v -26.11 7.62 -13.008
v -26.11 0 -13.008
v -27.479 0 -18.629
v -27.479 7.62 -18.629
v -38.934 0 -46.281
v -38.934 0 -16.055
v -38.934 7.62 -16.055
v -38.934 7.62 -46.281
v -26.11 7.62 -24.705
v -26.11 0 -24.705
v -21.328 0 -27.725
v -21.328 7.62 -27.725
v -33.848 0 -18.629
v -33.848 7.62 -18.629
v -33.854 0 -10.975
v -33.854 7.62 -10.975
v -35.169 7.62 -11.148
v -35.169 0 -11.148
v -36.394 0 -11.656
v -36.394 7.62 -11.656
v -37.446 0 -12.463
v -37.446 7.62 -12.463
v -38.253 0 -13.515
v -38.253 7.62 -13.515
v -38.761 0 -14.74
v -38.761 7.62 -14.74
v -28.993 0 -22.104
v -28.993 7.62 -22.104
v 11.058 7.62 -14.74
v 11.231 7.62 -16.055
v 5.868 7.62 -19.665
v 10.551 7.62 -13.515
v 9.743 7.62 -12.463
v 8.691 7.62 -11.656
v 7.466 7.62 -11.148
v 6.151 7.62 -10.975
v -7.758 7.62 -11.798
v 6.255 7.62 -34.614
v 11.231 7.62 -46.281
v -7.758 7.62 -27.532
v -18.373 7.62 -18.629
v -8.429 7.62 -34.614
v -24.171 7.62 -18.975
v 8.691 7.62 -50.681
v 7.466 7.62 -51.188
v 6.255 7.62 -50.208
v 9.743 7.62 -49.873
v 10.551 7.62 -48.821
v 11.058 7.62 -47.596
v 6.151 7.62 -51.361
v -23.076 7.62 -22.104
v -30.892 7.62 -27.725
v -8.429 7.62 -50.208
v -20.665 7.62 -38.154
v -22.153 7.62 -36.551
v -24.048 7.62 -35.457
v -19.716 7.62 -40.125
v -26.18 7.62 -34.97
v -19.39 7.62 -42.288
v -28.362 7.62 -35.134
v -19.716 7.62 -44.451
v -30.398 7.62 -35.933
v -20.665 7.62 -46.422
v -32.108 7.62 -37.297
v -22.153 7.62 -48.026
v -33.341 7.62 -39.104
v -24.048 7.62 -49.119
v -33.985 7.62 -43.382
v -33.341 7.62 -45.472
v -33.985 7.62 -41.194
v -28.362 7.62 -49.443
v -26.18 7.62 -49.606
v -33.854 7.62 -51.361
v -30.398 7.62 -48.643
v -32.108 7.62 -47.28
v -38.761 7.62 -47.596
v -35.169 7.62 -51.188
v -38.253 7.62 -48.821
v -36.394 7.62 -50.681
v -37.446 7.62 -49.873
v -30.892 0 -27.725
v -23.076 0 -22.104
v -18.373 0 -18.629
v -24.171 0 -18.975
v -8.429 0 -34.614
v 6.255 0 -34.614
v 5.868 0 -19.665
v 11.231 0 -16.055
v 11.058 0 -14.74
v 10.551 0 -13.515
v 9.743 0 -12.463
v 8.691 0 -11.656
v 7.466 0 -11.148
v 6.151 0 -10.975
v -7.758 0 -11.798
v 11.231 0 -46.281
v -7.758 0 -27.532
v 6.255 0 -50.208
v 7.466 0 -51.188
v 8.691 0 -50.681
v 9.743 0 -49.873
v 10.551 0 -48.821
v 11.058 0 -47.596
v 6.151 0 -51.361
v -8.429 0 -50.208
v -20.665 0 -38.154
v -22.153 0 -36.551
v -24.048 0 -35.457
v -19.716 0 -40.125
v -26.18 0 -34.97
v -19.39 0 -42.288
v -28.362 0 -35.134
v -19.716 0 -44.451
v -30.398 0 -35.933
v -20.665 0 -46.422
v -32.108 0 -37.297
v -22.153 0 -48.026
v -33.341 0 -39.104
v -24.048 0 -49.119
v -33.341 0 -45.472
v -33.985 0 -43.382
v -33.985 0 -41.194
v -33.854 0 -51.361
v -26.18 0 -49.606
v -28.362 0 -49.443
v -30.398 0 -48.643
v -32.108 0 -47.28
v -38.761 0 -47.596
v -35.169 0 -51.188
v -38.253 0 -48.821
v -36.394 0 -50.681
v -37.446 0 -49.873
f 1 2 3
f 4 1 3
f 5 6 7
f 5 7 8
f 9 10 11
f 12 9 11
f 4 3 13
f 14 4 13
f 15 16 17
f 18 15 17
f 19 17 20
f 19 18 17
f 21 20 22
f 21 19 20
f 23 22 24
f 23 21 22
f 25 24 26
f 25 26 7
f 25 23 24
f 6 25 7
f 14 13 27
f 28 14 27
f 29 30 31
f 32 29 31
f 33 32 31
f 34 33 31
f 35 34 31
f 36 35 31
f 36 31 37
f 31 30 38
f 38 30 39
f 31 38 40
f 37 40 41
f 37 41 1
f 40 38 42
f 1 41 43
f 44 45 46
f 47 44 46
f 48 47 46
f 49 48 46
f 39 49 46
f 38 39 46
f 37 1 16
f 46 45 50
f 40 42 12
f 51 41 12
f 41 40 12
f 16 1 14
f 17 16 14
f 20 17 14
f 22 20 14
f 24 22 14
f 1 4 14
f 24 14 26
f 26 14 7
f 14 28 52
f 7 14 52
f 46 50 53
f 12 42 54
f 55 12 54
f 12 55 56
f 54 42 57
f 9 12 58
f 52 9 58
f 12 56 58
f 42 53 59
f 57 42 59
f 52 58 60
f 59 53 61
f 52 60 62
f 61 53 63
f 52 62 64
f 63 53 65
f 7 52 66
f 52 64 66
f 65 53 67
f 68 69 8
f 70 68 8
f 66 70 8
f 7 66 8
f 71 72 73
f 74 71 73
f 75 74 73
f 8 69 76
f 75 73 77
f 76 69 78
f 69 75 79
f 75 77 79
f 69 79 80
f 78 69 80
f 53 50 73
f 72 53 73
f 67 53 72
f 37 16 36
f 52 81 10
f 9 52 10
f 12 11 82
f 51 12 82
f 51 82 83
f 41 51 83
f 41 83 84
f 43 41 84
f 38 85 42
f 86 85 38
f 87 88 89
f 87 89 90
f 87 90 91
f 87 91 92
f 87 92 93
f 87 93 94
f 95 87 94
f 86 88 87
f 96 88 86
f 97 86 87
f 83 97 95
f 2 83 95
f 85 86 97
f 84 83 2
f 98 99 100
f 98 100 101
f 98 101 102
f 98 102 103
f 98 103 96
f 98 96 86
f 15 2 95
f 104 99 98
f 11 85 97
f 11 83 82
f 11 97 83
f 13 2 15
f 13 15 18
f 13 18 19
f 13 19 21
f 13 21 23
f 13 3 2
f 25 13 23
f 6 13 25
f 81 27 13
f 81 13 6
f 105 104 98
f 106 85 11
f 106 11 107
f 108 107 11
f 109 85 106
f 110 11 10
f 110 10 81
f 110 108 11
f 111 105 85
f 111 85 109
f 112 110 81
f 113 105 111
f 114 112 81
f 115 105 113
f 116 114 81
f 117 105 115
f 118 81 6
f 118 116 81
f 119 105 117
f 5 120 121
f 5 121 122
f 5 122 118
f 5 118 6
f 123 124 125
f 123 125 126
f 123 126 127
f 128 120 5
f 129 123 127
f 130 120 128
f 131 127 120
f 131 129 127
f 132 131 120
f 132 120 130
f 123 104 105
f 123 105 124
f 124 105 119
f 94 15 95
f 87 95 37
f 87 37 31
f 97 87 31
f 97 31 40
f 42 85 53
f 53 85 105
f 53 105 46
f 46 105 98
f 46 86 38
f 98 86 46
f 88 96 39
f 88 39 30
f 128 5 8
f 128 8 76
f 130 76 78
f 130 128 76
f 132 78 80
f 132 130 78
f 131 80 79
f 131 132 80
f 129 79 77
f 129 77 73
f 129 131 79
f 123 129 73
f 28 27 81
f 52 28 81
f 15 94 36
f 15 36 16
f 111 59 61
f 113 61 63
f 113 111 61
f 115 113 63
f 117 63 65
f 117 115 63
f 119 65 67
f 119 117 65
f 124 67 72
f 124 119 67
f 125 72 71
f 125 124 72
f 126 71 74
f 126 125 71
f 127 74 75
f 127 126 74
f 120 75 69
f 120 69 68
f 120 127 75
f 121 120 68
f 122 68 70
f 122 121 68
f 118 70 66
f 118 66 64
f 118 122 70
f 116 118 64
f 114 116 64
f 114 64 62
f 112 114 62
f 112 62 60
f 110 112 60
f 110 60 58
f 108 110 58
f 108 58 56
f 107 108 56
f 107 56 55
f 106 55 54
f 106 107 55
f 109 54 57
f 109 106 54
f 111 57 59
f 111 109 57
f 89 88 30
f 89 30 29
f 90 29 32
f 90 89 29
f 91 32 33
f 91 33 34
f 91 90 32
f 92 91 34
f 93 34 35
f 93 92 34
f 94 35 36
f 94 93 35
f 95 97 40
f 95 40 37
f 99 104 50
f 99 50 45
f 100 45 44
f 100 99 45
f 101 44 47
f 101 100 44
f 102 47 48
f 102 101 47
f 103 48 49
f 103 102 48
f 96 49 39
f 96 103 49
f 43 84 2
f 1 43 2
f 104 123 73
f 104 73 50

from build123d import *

# Parameters (mm, degrees)
SKETCH1_R           = 7.338508892
SKETCH1_W           = 14.683745891
SKETCH1_H           = 15.594449323
BOSS_EXTRUDE6_DEPTH = 7.62


with BuildPart() as part:
    # Sketch1 → Boss-Extrude6 (new body)
    with BuildSketch(Plane(origin=(0, 0, 0), x_dir=(1, 0, 0), z_dir=(0, 1, 0))):
        with BuildLine():
            Line((-33.85382456, 51.361208868), (6.15117544, 51.361208868))
            ThreePointArc((6.15117544, 51.361208868), (9.743277889, 49.873311317), (11.23117544, 46.281208868))
            Line((11.23117544, 46.281208868), (11.23117544, 16.055208868))
            ThreePointArc((11.23117544, 16.055208868), (9.743277889, 12.46310642), (6.15117544, 10.975208868))
            Line((6.15117544, 10.975208868), (-33.85382456, 10.975208868))
            ThreePointArc((-33.85382456, 10.975208868), (-37.445927008, 12.46310642), (-38.93382456, 16.055208868))
            Line((-38.93382456, 16.055208868), (-38.93382456, 46.281208868))
            ThreePointArc((-38.93382456, 46.281208868), (-37.445927008, 49.873311317), (-33.85382456, 51.361208868))
        make_face()
        with Locations((-26.728784531, 42.288093859)):
            Circle(SKETCH1_R, mode=Mode.SUBTRACT)
        Polygon((-26.110126673, 13.007611736), (-27.479198511, 18.629319113), (-33.847743068, 18.629319113), (-28.993277919, 22.103725346), (-30.892236597, 27.725432723), (-26.110126673, 24.705324634), (-21.328016749, 27.725432723), (-23.076426813, 22.103725346), (-18.372510278, 18.629319113), (-24.17123819, 18.974896902), align=None, mode=Mode.SUBTRACT)
        with Locations((-1.086674016, 42.41081801)):
            Rectangle(SKETCH1_W, SKETCH1_H, mode=Mode.SUBTRACT)
        Polygon((5.867569864, 19.665294437), (-7.758291576, 27.532189206), (-7.758291576, 11.798399667), align=None, mode=Mode.SUBTRACT)
    extrude(amount=BOSS_EXTRUDE6_DEPTH)


solid = part.part
